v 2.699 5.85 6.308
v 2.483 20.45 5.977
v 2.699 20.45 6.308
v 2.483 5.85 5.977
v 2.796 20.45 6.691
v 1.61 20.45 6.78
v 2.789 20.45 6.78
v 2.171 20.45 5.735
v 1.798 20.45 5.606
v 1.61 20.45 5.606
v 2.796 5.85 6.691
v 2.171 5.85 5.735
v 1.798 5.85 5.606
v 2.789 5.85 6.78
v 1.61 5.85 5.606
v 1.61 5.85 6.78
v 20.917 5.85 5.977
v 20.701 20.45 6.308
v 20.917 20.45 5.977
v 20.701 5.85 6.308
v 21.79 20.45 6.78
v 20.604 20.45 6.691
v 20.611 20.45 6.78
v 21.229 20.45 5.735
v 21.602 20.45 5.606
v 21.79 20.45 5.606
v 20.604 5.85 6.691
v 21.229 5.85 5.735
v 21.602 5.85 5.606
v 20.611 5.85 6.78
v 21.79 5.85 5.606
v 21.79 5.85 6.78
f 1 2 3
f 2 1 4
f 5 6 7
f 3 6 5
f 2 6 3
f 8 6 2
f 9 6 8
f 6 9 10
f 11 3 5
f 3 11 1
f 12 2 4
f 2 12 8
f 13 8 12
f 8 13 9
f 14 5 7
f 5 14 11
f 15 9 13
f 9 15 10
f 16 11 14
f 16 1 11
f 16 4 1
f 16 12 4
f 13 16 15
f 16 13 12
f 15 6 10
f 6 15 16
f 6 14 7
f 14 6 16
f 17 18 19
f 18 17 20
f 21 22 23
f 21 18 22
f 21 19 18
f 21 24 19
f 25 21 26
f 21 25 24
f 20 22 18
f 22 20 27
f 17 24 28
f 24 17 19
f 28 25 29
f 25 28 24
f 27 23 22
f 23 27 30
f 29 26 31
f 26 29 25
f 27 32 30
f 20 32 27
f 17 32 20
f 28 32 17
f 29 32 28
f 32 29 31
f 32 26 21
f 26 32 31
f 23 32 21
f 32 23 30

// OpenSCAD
BOARD_X = 18;
BOARD_Y = 22;

BOARD_SOLDER_HEIGHT = 3;
BOARD_THICK = 1.2;

WALL_THICKNESS = 1.6;

TOLERANCE = 1.2;
TOLERANCE_X_ADD = 1;

$fs=0.4;
$fa=1;

// Calculated values
BASE_X = BOARD_X + (WALL_THICKNESS * 2) + TOLERANCE + TOLERANCE_X_ADD;
BASE_Y = BOARD_Y + (WALL_THICKNESS * 2) + TOLERANCE;
BASE_HEIGHT = 4;

module amp_mount_base() {
    // Make the main base        
    cube([BASE_X,BASE_Y,WALL_THICKNESS]);
}

module amp_mount_walls() {
    
    union() {

        // Make X=0 wall
        translate([0,0,WALL_THICKNESS-0.01]) cube([WALL_THICKNESS,BASE_Y,BASE_HEIGHT + TOLERANCE]);
        // Make X=X wall
        translate([BASE_X - WALL_THICKNESS,0,WALL_THICKNESS-0.01]) cube([WALL_THICKNESS,BASE_Y,BASE_HEIGHT + TOLERANCE]);

        // Make Y=0 wall
        translate([0,0,WALL_THICKNESS-0.01]) cube([BASE_X,WALL_THICKNESS,BASE_HEIGHT + TOLERANCE]);
        // Make Y=Y wall
        translate([0,BASE_Y - WALL_THICKNESS,WALL_THICKNESS-0.01]) cube([BASE_X,WALL_THICKNESS,BASE_HEIGHT + TOLERANCE]);
        
    }
}

module amp_mount_surface() {
    // Internal mounting surface for the board. Leaves room for the soldered pins.

    PIN_SPACING = 3; // with some tolerance

    difference() {
        color("green")
            cube([BOARD_X + TOLERANCE + TOLERANCE_X_ADD + 0.02, BOARD_Y + TOLERANCE + 0.02, BOARD_SOLDER_HEIGHT]);

        union() {

            translate([-0.01,-0.01,-0.01]) 
                color("red") 
                cube([PIN_SPACING * 3 + 0.04, PIN_SPACING + 0.02, BOARD_SOLDER_HEIGHT + 0.02]);

            translate([BASE_X - (WALL_THICKNESS * 2) - (PIN_SPACING*2) - 0.01, -0.01, -0.01]) 
                color("red")
                cube([PIN_SPACING * 2 + 0.04, PIN_SPACING + 0.02, BOARD_SOLDER_HEIGHT + 0.02]);
            
            translate([-0.01, BASE_Y - (WALL_THICKNESS * 2) - (PIN_SPACING) - 0.01, -0.01])
                color("red")
                cube([PIN_SPACING * 2 + 0.04, PIN_SPACING + 0.04, BOARD_SOLDER_HEIGHT + 0.02]);

            translate([BASE_X - (WALL_THICKNESS * 2) - (PIN_SPACING*2) - 0.01, BASE_Y - (WALL_THICKNESS * 2) - PIN_SPACING - 0.01, -0.01])
                color("red")
                cube([PIN_SPACING * 2 + 0.04, PIN_SPACING + 0.04, BOARD_SOLDER_HEIGHT + 0.02]);

        }
    }
}

module amp_mount_retention_bump() {

    RADIUS = 1.2;

    difference() {
        rotate([0,270,0])
            difference() {

                color("blue")
                    rotate([270,0,0])
                    cylinder(h=BOARD_Y - 7.4, r=RADIUS);

                translate([0 - RADIUS - 0.01,-0.01,-0.01])
                    cube([RADIUS * 2 + 0.02, BOARD_Y - 5.4 + 0.02, RADIUS + 0.02]);
            }
        
        translate([0 - RADIUS - 0.01, -0.01, -0.01])
                cube([RADIUS * 2 + 0.02, BOARD_Y - 5.4 + 0.02, RADIUS + 0.02]);
    }
}

module amp_mount() {
    amp_mount_base();
    amp_mount_walls();
    translate([WALL_THICKNESS-0.01, WALL_THICKNESS-0.01, WALL_THICKNESS-0.01]) amp_mount_surface();
}

module amp_mount_retention_bumps() {}
    translate([WALL_THICKNESS,WALL_THICKNESS + 4.25, BASE_HEIGHT + BOARD_THICK + 0.4 + WALL_THICKNESS - 0.41])
        amp_mount_retention_bump();
    translate([BASE_X - WALL_THICKNESS,WALL_THICKNESS + 4.25, BASE_HEIGHT + BOARD_THICK + 0.4 + WALL_THICKNESS - 0.41])
        rotate([0,180,0])
        mirror([0,0,1])
        amp_mount_retention_bump();
